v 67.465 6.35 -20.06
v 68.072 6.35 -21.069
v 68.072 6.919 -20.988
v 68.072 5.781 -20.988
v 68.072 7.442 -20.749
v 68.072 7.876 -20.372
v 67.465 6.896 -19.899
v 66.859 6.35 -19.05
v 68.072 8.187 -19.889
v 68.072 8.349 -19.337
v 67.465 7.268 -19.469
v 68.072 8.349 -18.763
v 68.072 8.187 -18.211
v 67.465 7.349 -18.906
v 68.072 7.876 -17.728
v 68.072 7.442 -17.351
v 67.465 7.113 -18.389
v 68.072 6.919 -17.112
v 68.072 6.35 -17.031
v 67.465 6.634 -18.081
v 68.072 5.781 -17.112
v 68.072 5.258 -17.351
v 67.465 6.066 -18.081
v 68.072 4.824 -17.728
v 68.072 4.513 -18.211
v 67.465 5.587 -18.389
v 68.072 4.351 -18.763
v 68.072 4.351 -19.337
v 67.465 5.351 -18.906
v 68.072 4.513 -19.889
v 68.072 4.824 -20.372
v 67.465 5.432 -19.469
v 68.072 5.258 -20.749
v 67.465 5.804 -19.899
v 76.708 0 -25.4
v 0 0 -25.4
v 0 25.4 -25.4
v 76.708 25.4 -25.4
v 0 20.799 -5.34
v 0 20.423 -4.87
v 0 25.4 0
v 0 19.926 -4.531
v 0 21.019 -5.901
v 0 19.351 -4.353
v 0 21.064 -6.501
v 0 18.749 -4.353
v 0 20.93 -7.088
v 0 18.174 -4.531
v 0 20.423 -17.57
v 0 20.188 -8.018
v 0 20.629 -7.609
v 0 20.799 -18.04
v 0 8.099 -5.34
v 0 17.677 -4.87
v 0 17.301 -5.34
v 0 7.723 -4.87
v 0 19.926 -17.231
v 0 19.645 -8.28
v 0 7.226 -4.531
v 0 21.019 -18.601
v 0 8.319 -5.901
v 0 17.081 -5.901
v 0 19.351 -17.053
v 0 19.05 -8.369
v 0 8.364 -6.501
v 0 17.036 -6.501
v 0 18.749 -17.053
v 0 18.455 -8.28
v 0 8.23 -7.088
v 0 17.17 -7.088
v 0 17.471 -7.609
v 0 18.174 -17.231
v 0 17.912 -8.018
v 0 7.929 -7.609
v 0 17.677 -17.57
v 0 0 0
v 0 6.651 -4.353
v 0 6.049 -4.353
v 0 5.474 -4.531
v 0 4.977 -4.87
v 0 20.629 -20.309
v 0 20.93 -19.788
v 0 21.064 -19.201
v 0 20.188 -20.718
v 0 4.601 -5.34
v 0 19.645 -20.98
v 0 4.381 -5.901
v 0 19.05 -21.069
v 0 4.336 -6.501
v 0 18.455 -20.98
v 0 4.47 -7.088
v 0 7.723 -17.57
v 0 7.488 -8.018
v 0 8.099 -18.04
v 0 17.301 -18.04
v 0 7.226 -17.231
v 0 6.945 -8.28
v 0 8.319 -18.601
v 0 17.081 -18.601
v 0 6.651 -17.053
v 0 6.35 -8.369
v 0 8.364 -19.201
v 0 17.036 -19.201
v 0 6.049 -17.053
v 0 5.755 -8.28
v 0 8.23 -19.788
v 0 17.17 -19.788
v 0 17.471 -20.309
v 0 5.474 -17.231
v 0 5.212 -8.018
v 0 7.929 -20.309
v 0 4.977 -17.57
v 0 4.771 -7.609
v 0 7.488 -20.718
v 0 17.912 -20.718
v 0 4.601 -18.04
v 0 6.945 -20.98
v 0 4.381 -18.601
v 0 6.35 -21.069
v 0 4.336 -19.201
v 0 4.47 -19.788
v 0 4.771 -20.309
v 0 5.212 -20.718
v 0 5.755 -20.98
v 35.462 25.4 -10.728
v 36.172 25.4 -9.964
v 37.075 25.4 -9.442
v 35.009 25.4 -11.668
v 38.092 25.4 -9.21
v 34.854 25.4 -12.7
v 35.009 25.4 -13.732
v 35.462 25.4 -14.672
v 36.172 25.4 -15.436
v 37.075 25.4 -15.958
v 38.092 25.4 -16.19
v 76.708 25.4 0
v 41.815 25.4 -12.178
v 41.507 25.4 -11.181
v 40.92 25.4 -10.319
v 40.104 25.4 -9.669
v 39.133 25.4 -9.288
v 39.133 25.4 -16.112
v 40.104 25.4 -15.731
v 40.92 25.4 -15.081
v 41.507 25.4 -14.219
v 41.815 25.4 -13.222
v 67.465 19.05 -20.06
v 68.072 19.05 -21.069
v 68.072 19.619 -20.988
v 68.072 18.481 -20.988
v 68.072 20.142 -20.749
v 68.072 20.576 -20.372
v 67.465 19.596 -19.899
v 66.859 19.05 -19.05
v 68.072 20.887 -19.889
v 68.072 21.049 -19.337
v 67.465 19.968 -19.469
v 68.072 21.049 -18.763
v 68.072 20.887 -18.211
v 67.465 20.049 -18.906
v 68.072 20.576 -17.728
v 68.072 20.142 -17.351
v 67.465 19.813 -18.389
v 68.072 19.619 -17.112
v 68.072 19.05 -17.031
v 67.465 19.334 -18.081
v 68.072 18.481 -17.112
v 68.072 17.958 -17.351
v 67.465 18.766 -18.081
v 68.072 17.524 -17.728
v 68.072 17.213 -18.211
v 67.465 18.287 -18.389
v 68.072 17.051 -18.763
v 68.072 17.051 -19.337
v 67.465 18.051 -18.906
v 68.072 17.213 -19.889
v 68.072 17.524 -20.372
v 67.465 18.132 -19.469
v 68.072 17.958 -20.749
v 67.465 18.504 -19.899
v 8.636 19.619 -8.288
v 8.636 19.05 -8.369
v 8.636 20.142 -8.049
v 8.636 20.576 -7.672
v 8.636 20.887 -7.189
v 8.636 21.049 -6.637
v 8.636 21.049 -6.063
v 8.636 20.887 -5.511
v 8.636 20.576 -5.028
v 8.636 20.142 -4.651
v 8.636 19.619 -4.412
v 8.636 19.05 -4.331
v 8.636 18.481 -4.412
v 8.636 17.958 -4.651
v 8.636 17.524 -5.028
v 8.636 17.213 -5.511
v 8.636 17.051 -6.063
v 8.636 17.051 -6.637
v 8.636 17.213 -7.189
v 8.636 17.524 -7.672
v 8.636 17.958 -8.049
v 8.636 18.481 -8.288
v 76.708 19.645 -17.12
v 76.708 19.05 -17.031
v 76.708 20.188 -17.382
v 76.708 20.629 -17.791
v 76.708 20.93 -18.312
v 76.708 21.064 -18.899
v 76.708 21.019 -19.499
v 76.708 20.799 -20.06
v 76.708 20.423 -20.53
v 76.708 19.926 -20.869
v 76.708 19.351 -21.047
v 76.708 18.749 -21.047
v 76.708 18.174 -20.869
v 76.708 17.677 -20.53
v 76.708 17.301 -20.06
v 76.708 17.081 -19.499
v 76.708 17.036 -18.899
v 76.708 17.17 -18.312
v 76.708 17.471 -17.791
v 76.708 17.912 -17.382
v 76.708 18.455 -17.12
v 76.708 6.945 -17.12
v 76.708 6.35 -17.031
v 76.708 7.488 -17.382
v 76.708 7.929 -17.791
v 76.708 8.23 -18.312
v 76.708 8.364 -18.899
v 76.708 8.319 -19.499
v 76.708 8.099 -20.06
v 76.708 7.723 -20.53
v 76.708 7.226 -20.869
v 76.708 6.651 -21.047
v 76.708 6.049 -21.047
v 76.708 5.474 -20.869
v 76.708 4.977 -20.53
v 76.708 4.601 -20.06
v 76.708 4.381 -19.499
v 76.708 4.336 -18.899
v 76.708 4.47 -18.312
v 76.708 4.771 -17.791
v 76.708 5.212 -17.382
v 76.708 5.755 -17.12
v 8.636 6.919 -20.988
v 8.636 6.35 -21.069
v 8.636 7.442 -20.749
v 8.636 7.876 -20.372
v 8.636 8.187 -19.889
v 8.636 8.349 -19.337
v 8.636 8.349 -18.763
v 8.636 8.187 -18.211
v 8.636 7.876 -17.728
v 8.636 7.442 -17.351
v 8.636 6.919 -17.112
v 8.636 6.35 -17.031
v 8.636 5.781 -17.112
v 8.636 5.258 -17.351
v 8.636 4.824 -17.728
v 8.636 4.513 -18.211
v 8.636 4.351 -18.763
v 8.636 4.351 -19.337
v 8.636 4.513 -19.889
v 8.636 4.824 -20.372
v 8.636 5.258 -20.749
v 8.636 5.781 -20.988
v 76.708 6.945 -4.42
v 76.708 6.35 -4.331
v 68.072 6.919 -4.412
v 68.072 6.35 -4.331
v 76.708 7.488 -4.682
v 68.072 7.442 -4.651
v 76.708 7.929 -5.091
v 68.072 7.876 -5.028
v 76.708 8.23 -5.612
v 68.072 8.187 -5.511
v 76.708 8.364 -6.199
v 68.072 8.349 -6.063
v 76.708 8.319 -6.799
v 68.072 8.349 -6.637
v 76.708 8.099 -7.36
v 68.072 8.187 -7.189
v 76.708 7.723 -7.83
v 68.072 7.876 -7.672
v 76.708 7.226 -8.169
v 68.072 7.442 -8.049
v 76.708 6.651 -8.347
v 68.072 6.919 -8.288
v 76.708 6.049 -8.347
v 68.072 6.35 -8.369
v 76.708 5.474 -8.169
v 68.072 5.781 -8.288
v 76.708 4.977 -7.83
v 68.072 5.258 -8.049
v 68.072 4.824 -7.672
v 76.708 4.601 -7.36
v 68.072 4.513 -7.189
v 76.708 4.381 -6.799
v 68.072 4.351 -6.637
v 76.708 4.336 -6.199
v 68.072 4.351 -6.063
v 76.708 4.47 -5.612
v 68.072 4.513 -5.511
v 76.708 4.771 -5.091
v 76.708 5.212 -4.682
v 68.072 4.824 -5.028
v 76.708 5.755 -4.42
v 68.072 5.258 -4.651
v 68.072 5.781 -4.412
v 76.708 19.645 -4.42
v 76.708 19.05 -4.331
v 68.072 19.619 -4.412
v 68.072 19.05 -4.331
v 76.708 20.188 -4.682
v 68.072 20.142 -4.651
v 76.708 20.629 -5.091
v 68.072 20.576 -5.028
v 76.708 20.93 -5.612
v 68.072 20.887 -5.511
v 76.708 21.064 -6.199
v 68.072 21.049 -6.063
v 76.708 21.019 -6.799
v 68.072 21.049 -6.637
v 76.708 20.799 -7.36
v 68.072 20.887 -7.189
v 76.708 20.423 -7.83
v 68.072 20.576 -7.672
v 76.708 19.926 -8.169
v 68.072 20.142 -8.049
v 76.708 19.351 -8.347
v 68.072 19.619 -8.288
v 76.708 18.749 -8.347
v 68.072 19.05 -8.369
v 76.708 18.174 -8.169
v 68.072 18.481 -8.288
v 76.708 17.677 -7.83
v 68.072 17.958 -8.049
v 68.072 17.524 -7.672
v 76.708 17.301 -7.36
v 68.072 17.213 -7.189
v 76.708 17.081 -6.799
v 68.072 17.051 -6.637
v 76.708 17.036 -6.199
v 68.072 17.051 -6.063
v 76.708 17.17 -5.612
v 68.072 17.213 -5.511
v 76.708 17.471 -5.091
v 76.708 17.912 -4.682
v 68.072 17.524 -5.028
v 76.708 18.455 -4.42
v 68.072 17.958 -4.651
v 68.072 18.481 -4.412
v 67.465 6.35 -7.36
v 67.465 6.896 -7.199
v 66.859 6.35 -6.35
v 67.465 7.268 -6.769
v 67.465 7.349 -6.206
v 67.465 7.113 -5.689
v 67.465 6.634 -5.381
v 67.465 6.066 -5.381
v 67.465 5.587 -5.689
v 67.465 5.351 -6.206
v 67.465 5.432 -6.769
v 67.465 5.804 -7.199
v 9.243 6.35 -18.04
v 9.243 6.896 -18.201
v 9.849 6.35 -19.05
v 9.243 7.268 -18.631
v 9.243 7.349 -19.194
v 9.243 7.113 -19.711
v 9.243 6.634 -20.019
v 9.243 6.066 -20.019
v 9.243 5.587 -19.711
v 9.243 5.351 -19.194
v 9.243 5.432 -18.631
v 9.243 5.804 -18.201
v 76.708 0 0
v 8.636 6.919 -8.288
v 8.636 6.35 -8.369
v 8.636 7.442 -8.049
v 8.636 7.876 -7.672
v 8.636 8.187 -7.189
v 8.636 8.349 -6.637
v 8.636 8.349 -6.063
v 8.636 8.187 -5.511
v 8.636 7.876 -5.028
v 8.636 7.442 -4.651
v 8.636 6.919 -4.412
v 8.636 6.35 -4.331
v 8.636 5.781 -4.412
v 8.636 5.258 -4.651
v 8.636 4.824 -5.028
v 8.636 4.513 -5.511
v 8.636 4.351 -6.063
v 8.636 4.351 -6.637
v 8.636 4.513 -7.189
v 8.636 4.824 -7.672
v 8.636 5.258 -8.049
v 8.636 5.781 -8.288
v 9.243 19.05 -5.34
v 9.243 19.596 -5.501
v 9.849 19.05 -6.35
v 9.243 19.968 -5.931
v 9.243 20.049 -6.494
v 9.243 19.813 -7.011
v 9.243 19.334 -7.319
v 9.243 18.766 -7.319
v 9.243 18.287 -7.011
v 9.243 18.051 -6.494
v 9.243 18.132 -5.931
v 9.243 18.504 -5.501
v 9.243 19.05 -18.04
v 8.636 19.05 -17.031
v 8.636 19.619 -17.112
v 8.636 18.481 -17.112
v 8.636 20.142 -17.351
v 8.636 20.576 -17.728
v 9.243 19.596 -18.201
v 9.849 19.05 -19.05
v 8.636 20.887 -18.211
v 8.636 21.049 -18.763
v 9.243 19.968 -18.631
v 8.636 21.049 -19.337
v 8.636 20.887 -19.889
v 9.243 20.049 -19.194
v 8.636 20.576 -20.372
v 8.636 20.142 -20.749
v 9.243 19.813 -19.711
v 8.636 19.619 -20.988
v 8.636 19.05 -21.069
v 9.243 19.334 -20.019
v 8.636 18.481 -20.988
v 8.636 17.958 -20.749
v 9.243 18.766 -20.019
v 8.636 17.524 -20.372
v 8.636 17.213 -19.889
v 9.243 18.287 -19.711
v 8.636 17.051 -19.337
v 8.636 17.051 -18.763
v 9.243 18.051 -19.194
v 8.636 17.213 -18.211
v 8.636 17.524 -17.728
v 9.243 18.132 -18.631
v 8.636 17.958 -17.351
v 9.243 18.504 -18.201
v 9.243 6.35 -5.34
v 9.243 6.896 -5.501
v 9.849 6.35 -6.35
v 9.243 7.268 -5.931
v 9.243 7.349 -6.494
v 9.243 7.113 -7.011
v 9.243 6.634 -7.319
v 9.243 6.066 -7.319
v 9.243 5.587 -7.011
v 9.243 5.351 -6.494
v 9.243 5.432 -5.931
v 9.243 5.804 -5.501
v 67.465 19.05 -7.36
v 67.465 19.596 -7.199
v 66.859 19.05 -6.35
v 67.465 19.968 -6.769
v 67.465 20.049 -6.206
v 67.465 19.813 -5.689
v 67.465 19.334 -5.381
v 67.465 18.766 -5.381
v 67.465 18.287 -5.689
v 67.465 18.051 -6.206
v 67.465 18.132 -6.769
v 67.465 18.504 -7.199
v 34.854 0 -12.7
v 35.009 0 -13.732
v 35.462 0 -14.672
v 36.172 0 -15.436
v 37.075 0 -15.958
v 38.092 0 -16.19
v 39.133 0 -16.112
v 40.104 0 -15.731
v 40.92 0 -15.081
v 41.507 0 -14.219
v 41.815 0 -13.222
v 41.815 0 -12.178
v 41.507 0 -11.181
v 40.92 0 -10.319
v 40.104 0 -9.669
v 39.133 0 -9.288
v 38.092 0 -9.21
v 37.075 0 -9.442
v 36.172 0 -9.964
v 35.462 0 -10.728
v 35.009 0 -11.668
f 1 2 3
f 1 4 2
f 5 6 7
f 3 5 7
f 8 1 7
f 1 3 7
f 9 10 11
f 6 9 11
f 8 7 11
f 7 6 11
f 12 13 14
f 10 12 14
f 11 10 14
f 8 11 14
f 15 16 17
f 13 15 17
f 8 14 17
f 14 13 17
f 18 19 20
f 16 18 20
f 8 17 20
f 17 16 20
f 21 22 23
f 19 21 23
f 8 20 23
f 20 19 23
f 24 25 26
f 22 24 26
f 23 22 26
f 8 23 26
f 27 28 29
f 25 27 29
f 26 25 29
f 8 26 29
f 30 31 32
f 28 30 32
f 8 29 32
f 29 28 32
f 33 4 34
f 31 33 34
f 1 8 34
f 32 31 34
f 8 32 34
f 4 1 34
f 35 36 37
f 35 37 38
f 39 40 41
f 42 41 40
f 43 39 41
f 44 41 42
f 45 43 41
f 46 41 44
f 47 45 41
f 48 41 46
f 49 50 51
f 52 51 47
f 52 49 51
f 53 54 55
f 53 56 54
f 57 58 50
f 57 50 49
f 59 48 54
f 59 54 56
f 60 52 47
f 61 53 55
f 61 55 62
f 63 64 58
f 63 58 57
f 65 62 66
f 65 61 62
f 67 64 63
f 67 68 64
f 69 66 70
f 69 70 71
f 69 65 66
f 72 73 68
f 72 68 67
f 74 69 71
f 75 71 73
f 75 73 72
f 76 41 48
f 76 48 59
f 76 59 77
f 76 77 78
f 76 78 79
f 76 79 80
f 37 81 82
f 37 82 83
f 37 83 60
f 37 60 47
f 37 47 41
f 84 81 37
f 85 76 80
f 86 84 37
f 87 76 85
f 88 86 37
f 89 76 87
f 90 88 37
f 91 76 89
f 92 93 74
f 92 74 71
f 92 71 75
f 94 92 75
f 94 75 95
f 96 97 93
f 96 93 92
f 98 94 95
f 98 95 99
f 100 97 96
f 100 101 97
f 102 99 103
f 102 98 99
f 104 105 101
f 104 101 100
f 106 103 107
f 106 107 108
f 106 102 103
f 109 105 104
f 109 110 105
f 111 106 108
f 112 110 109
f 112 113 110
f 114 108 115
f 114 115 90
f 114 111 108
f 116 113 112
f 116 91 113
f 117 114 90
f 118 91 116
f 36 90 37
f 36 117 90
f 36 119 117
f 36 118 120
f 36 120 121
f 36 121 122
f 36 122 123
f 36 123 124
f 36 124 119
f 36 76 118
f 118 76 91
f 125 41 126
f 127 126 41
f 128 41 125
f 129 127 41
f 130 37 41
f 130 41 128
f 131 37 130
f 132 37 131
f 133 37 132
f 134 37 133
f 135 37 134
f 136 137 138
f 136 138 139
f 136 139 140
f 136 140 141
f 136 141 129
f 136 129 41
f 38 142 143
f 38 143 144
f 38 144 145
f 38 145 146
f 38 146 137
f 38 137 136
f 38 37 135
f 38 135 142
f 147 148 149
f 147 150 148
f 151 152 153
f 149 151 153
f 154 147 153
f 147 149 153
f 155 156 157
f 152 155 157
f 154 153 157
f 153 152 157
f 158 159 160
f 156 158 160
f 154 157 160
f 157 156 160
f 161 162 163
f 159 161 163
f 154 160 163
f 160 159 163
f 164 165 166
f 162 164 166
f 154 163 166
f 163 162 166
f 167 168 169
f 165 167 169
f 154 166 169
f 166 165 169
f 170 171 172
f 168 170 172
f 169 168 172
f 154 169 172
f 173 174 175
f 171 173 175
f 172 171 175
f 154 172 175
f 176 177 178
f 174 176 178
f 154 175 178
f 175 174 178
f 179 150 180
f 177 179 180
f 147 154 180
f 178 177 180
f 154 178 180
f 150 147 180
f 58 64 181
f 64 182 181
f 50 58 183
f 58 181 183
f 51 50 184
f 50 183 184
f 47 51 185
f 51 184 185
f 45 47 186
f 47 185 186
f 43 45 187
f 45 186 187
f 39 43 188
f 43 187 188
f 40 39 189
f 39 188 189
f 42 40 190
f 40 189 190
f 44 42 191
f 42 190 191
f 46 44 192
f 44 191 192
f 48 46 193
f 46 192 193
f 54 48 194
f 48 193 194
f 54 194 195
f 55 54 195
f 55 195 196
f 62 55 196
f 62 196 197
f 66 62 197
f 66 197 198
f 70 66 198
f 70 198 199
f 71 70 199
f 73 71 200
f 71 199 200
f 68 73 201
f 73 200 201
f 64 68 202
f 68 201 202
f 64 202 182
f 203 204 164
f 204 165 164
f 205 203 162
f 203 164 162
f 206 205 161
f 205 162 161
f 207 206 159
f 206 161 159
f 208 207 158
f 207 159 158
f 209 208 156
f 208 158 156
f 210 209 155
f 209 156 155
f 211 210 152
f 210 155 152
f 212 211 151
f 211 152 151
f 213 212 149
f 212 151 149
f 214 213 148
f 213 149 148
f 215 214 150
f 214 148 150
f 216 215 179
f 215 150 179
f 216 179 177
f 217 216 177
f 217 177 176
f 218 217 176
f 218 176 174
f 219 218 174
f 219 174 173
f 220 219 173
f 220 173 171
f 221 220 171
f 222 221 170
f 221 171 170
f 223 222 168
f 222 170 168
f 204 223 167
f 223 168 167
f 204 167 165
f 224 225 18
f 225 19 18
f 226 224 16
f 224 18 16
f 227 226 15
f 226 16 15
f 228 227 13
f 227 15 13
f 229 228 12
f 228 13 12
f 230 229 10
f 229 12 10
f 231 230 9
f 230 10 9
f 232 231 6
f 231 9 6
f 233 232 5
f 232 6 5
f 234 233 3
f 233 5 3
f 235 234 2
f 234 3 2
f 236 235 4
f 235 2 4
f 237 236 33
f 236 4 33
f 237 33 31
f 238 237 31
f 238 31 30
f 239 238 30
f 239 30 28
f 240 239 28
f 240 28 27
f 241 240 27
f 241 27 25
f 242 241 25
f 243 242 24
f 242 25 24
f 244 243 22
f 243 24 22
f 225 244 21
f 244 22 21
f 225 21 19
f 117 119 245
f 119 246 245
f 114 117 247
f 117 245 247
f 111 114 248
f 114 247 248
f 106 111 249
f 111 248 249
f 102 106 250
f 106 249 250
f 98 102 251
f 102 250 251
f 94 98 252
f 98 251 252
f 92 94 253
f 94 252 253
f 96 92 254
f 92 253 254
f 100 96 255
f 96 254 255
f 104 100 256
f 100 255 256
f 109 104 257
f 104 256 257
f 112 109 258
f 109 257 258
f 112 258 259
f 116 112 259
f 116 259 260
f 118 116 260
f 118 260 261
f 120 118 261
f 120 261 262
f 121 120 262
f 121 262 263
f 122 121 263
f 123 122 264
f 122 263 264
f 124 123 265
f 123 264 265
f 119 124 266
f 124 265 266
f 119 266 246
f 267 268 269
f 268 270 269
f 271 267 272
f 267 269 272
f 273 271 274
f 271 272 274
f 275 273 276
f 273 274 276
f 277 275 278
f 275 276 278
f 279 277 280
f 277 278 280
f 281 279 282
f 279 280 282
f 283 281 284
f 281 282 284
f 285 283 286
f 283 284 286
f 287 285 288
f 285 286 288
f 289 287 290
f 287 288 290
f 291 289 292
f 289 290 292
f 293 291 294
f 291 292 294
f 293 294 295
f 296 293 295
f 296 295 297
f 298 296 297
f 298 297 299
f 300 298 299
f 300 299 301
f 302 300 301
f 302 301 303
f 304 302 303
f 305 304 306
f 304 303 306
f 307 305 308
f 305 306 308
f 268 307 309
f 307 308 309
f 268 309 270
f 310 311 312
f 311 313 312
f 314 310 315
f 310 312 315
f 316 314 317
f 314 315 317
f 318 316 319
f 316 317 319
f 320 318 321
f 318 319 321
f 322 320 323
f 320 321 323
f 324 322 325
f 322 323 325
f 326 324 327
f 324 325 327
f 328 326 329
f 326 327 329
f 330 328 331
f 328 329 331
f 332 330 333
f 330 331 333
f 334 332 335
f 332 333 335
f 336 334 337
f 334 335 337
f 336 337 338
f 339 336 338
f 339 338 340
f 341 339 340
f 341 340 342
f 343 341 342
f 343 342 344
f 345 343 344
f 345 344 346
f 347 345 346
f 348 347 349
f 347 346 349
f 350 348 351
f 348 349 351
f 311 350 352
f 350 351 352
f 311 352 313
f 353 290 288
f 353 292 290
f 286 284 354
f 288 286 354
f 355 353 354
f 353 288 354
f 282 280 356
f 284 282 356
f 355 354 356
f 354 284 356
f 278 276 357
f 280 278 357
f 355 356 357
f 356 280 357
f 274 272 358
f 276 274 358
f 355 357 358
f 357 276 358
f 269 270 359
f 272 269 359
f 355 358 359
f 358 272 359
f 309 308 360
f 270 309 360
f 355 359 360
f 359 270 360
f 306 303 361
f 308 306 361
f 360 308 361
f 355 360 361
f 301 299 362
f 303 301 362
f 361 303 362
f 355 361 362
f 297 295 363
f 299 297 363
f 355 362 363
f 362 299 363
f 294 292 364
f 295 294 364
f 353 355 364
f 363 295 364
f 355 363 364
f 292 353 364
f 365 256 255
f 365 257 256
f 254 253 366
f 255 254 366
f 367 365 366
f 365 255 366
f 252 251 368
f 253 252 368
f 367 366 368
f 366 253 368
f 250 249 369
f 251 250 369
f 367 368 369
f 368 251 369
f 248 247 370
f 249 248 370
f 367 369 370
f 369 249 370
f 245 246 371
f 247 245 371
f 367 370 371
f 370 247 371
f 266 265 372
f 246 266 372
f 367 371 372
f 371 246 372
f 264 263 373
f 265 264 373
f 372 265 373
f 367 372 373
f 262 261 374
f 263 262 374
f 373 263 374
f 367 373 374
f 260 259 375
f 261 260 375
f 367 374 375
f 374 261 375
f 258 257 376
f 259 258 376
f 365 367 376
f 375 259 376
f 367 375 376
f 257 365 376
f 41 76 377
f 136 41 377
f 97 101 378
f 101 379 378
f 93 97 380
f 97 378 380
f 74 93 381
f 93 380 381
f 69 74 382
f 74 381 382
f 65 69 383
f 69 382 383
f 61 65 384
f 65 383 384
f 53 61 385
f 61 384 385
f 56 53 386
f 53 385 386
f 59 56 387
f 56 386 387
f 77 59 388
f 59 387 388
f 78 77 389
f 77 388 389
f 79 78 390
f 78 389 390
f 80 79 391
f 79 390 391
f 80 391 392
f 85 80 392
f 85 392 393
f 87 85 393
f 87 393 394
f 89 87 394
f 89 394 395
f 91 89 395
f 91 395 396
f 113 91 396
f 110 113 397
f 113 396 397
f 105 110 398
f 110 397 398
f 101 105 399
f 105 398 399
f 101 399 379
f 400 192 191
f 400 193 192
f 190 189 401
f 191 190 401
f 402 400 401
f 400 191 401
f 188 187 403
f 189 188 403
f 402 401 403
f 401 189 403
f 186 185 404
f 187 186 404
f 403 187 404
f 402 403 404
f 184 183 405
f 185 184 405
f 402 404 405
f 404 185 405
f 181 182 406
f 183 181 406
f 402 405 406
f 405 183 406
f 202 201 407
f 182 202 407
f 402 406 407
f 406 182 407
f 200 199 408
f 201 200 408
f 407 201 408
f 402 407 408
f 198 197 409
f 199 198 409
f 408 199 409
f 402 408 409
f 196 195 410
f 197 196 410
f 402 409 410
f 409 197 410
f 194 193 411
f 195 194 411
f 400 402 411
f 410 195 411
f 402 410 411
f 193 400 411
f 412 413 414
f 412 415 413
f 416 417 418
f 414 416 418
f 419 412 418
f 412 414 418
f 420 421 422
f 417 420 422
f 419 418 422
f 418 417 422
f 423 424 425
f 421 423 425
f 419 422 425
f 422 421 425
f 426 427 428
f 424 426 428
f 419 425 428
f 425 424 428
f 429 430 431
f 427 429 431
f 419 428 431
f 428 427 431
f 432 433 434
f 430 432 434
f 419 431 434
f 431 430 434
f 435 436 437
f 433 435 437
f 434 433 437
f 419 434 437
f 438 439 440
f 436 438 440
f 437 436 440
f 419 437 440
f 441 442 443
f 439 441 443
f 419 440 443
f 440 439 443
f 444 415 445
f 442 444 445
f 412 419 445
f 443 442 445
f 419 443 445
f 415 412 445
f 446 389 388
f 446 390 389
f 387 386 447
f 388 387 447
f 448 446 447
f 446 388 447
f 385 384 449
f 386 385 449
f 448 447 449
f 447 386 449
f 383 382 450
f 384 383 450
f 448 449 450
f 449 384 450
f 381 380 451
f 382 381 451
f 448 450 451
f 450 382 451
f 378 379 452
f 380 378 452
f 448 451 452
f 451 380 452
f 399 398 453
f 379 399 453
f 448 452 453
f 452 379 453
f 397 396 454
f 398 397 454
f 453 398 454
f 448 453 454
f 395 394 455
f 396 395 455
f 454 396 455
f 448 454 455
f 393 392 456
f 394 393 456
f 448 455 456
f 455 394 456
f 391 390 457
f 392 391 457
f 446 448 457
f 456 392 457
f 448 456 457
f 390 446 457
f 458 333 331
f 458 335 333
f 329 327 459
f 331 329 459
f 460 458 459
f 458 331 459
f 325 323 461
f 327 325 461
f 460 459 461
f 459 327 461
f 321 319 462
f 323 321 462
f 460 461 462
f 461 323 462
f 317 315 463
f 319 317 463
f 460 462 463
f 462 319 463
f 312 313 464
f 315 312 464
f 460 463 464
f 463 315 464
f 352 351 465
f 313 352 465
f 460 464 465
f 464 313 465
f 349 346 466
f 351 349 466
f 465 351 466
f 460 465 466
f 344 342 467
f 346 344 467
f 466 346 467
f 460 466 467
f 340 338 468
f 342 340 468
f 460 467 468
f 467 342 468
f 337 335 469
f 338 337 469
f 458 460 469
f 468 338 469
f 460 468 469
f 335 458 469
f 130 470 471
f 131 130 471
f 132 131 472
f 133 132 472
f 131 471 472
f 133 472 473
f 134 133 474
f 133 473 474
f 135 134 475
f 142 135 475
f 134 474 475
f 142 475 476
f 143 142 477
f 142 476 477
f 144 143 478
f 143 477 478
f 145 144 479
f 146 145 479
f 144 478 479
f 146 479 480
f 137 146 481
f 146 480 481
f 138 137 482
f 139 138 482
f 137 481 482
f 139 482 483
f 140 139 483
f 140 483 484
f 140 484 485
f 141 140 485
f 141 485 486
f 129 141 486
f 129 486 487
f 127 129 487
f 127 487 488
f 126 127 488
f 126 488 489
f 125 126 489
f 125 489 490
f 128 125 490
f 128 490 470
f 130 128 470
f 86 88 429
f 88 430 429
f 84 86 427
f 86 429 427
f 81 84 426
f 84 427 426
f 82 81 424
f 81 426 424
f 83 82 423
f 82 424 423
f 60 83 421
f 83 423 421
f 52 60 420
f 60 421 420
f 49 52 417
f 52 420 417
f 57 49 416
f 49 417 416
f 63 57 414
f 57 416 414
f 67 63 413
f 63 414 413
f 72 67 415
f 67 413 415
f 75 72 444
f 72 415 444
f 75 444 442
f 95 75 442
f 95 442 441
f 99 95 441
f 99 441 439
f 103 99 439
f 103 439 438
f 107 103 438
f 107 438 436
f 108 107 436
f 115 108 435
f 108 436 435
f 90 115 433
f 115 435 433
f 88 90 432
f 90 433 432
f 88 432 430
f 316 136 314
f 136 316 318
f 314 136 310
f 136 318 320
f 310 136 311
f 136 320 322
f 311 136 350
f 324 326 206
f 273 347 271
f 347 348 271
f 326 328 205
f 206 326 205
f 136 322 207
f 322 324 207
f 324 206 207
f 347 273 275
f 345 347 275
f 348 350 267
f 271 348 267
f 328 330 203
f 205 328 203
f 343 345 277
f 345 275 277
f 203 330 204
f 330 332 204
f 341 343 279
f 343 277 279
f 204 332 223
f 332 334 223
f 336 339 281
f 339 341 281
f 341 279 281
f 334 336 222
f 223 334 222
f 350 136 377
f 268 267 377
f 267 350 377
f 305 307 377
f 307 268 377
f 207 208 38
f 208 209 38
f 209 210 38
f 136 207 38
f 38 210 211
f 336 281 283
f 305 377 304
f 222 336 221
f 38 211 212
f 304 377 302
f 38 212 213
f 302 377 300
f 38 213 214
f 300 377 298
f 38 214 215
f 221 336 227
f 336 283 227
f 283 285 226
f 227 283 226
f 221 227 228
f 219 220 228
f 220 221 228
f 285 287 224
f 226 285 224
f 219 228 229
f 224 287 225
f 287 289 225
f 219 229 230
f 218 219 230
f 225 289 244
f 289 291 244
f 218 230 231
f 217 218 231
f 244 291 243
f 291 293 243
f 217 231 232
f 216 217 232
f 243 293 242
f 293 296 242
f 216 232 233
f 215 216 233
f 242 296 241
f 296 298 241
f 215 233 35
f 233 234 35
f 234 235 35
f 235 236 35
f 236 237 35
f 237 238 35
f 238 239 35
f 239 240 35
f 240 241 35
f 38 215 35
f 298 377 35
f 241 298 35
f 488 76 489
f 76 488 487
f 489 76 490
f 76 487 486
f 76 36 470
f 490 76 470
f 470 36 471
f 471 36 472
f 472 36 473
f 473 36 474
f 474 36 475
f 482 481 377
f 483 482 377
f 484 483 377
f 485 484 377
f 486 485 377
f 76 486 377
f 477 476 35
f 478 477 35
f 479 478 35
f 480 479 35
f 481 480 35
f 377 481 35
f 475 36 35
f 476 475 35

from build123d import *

# Parameters (mm, degrees)
SKETCH1_W                  = 76.708
SKETCH1_H                  = 25.4
BOSS_EXTRUDE1_DEPTH        = 25.4
F_10_32_TAPPED_HOLE1_D     = 4.0386
F_10_32_TAPPED_HOLE1_DEPTH = 8.636
F_10_32_TAPPED_HOLE1_TIP   = 1.213317848
F_10_32_TAPPED_HOLE2_D     = 4.0386
F_10_32_TAPPED_HOLE2_DEPTH = 8.636
F_10_32_TAPPED_HOLE2_TIP   = 1.213317848
F_6_0MM_DOWEL_HOLE1_D      = 7


with BuildPart() as part:
    # Sketch1 → Boss-Extrude1 (new body)
    with BuildSketch(Plane(origin=(0, 0, 0), x_dir=(1, 0, 0), z_dir=(0, 1, 0))):
        with Locations((38.354, 12.7)):
            Rectangle(SKETCH1_W, SKETCH1_H)
    extrude(amount=BOSS_EXTRUDE1_DEPTH)

    # #10-32 Tapped Hole1
    with Locations(Plane(origin=(76.708, 0, 0), x_dir=(0, 0, -1), z_dir=(1, 0, 0))):
        with Locations((6.35, 19.05), (19.05, 19.05), (19.05, 6.35), (6.35, 6.35)):
            Hole(F_10_32_TAPPED_HOLE1_D / 2, depth=F_10_32_TAPPED_HOLE1_DEPTH)
            with Locations((0, 0, -(F_10_32_TAPPED_HOLE1_DEPTH + F_10_32_TAPPED_HOLE1_TIP / 2))):  # 118° drill point
                Cone(0, F_10_32_TAPPED_HOLE1_D / 2, F_10_32_TAPPED_HOLE1_TIP, mode=Mode.SUBTRACT)

    # #10-32 Tapped Hole2
    with Locations(Plane.ZY):
        with Locations((-19.05, 19.05), (-6.35, 19.05), (-6.35, 6.35), (-19.05, 6.35)):
            Hole(F_10_32_TAPPED_HOLE2_D / 2, depth=F_10_32_TAPPED_HOLE2_DEPTH)
            with Locations((0, 0, -(F_10_32_TAPPED_HOLE2_DEPTH + F_10_32_TAPPED_HOLE2_TIP / 2))):  # 118° drill point
                Cone(0, F_10_32_TAPPED_HOLE2_D / 2, F_10_32_TAPPED_HOLE2_TIP, mode=Mode.SUBTRACT)

    # Ø6.0mm Dowel Hole1 (through all)
    with Locations(Plane(origin=(0, 25.4, 0), x_dir=(1, 0, 0), z_dir=(0, 1, 0))):
        with Locations((38.354, 12.7)):
            Hole(F_6_0MM_DOWEL_HOLE1_D / 2)


solid = part.part
